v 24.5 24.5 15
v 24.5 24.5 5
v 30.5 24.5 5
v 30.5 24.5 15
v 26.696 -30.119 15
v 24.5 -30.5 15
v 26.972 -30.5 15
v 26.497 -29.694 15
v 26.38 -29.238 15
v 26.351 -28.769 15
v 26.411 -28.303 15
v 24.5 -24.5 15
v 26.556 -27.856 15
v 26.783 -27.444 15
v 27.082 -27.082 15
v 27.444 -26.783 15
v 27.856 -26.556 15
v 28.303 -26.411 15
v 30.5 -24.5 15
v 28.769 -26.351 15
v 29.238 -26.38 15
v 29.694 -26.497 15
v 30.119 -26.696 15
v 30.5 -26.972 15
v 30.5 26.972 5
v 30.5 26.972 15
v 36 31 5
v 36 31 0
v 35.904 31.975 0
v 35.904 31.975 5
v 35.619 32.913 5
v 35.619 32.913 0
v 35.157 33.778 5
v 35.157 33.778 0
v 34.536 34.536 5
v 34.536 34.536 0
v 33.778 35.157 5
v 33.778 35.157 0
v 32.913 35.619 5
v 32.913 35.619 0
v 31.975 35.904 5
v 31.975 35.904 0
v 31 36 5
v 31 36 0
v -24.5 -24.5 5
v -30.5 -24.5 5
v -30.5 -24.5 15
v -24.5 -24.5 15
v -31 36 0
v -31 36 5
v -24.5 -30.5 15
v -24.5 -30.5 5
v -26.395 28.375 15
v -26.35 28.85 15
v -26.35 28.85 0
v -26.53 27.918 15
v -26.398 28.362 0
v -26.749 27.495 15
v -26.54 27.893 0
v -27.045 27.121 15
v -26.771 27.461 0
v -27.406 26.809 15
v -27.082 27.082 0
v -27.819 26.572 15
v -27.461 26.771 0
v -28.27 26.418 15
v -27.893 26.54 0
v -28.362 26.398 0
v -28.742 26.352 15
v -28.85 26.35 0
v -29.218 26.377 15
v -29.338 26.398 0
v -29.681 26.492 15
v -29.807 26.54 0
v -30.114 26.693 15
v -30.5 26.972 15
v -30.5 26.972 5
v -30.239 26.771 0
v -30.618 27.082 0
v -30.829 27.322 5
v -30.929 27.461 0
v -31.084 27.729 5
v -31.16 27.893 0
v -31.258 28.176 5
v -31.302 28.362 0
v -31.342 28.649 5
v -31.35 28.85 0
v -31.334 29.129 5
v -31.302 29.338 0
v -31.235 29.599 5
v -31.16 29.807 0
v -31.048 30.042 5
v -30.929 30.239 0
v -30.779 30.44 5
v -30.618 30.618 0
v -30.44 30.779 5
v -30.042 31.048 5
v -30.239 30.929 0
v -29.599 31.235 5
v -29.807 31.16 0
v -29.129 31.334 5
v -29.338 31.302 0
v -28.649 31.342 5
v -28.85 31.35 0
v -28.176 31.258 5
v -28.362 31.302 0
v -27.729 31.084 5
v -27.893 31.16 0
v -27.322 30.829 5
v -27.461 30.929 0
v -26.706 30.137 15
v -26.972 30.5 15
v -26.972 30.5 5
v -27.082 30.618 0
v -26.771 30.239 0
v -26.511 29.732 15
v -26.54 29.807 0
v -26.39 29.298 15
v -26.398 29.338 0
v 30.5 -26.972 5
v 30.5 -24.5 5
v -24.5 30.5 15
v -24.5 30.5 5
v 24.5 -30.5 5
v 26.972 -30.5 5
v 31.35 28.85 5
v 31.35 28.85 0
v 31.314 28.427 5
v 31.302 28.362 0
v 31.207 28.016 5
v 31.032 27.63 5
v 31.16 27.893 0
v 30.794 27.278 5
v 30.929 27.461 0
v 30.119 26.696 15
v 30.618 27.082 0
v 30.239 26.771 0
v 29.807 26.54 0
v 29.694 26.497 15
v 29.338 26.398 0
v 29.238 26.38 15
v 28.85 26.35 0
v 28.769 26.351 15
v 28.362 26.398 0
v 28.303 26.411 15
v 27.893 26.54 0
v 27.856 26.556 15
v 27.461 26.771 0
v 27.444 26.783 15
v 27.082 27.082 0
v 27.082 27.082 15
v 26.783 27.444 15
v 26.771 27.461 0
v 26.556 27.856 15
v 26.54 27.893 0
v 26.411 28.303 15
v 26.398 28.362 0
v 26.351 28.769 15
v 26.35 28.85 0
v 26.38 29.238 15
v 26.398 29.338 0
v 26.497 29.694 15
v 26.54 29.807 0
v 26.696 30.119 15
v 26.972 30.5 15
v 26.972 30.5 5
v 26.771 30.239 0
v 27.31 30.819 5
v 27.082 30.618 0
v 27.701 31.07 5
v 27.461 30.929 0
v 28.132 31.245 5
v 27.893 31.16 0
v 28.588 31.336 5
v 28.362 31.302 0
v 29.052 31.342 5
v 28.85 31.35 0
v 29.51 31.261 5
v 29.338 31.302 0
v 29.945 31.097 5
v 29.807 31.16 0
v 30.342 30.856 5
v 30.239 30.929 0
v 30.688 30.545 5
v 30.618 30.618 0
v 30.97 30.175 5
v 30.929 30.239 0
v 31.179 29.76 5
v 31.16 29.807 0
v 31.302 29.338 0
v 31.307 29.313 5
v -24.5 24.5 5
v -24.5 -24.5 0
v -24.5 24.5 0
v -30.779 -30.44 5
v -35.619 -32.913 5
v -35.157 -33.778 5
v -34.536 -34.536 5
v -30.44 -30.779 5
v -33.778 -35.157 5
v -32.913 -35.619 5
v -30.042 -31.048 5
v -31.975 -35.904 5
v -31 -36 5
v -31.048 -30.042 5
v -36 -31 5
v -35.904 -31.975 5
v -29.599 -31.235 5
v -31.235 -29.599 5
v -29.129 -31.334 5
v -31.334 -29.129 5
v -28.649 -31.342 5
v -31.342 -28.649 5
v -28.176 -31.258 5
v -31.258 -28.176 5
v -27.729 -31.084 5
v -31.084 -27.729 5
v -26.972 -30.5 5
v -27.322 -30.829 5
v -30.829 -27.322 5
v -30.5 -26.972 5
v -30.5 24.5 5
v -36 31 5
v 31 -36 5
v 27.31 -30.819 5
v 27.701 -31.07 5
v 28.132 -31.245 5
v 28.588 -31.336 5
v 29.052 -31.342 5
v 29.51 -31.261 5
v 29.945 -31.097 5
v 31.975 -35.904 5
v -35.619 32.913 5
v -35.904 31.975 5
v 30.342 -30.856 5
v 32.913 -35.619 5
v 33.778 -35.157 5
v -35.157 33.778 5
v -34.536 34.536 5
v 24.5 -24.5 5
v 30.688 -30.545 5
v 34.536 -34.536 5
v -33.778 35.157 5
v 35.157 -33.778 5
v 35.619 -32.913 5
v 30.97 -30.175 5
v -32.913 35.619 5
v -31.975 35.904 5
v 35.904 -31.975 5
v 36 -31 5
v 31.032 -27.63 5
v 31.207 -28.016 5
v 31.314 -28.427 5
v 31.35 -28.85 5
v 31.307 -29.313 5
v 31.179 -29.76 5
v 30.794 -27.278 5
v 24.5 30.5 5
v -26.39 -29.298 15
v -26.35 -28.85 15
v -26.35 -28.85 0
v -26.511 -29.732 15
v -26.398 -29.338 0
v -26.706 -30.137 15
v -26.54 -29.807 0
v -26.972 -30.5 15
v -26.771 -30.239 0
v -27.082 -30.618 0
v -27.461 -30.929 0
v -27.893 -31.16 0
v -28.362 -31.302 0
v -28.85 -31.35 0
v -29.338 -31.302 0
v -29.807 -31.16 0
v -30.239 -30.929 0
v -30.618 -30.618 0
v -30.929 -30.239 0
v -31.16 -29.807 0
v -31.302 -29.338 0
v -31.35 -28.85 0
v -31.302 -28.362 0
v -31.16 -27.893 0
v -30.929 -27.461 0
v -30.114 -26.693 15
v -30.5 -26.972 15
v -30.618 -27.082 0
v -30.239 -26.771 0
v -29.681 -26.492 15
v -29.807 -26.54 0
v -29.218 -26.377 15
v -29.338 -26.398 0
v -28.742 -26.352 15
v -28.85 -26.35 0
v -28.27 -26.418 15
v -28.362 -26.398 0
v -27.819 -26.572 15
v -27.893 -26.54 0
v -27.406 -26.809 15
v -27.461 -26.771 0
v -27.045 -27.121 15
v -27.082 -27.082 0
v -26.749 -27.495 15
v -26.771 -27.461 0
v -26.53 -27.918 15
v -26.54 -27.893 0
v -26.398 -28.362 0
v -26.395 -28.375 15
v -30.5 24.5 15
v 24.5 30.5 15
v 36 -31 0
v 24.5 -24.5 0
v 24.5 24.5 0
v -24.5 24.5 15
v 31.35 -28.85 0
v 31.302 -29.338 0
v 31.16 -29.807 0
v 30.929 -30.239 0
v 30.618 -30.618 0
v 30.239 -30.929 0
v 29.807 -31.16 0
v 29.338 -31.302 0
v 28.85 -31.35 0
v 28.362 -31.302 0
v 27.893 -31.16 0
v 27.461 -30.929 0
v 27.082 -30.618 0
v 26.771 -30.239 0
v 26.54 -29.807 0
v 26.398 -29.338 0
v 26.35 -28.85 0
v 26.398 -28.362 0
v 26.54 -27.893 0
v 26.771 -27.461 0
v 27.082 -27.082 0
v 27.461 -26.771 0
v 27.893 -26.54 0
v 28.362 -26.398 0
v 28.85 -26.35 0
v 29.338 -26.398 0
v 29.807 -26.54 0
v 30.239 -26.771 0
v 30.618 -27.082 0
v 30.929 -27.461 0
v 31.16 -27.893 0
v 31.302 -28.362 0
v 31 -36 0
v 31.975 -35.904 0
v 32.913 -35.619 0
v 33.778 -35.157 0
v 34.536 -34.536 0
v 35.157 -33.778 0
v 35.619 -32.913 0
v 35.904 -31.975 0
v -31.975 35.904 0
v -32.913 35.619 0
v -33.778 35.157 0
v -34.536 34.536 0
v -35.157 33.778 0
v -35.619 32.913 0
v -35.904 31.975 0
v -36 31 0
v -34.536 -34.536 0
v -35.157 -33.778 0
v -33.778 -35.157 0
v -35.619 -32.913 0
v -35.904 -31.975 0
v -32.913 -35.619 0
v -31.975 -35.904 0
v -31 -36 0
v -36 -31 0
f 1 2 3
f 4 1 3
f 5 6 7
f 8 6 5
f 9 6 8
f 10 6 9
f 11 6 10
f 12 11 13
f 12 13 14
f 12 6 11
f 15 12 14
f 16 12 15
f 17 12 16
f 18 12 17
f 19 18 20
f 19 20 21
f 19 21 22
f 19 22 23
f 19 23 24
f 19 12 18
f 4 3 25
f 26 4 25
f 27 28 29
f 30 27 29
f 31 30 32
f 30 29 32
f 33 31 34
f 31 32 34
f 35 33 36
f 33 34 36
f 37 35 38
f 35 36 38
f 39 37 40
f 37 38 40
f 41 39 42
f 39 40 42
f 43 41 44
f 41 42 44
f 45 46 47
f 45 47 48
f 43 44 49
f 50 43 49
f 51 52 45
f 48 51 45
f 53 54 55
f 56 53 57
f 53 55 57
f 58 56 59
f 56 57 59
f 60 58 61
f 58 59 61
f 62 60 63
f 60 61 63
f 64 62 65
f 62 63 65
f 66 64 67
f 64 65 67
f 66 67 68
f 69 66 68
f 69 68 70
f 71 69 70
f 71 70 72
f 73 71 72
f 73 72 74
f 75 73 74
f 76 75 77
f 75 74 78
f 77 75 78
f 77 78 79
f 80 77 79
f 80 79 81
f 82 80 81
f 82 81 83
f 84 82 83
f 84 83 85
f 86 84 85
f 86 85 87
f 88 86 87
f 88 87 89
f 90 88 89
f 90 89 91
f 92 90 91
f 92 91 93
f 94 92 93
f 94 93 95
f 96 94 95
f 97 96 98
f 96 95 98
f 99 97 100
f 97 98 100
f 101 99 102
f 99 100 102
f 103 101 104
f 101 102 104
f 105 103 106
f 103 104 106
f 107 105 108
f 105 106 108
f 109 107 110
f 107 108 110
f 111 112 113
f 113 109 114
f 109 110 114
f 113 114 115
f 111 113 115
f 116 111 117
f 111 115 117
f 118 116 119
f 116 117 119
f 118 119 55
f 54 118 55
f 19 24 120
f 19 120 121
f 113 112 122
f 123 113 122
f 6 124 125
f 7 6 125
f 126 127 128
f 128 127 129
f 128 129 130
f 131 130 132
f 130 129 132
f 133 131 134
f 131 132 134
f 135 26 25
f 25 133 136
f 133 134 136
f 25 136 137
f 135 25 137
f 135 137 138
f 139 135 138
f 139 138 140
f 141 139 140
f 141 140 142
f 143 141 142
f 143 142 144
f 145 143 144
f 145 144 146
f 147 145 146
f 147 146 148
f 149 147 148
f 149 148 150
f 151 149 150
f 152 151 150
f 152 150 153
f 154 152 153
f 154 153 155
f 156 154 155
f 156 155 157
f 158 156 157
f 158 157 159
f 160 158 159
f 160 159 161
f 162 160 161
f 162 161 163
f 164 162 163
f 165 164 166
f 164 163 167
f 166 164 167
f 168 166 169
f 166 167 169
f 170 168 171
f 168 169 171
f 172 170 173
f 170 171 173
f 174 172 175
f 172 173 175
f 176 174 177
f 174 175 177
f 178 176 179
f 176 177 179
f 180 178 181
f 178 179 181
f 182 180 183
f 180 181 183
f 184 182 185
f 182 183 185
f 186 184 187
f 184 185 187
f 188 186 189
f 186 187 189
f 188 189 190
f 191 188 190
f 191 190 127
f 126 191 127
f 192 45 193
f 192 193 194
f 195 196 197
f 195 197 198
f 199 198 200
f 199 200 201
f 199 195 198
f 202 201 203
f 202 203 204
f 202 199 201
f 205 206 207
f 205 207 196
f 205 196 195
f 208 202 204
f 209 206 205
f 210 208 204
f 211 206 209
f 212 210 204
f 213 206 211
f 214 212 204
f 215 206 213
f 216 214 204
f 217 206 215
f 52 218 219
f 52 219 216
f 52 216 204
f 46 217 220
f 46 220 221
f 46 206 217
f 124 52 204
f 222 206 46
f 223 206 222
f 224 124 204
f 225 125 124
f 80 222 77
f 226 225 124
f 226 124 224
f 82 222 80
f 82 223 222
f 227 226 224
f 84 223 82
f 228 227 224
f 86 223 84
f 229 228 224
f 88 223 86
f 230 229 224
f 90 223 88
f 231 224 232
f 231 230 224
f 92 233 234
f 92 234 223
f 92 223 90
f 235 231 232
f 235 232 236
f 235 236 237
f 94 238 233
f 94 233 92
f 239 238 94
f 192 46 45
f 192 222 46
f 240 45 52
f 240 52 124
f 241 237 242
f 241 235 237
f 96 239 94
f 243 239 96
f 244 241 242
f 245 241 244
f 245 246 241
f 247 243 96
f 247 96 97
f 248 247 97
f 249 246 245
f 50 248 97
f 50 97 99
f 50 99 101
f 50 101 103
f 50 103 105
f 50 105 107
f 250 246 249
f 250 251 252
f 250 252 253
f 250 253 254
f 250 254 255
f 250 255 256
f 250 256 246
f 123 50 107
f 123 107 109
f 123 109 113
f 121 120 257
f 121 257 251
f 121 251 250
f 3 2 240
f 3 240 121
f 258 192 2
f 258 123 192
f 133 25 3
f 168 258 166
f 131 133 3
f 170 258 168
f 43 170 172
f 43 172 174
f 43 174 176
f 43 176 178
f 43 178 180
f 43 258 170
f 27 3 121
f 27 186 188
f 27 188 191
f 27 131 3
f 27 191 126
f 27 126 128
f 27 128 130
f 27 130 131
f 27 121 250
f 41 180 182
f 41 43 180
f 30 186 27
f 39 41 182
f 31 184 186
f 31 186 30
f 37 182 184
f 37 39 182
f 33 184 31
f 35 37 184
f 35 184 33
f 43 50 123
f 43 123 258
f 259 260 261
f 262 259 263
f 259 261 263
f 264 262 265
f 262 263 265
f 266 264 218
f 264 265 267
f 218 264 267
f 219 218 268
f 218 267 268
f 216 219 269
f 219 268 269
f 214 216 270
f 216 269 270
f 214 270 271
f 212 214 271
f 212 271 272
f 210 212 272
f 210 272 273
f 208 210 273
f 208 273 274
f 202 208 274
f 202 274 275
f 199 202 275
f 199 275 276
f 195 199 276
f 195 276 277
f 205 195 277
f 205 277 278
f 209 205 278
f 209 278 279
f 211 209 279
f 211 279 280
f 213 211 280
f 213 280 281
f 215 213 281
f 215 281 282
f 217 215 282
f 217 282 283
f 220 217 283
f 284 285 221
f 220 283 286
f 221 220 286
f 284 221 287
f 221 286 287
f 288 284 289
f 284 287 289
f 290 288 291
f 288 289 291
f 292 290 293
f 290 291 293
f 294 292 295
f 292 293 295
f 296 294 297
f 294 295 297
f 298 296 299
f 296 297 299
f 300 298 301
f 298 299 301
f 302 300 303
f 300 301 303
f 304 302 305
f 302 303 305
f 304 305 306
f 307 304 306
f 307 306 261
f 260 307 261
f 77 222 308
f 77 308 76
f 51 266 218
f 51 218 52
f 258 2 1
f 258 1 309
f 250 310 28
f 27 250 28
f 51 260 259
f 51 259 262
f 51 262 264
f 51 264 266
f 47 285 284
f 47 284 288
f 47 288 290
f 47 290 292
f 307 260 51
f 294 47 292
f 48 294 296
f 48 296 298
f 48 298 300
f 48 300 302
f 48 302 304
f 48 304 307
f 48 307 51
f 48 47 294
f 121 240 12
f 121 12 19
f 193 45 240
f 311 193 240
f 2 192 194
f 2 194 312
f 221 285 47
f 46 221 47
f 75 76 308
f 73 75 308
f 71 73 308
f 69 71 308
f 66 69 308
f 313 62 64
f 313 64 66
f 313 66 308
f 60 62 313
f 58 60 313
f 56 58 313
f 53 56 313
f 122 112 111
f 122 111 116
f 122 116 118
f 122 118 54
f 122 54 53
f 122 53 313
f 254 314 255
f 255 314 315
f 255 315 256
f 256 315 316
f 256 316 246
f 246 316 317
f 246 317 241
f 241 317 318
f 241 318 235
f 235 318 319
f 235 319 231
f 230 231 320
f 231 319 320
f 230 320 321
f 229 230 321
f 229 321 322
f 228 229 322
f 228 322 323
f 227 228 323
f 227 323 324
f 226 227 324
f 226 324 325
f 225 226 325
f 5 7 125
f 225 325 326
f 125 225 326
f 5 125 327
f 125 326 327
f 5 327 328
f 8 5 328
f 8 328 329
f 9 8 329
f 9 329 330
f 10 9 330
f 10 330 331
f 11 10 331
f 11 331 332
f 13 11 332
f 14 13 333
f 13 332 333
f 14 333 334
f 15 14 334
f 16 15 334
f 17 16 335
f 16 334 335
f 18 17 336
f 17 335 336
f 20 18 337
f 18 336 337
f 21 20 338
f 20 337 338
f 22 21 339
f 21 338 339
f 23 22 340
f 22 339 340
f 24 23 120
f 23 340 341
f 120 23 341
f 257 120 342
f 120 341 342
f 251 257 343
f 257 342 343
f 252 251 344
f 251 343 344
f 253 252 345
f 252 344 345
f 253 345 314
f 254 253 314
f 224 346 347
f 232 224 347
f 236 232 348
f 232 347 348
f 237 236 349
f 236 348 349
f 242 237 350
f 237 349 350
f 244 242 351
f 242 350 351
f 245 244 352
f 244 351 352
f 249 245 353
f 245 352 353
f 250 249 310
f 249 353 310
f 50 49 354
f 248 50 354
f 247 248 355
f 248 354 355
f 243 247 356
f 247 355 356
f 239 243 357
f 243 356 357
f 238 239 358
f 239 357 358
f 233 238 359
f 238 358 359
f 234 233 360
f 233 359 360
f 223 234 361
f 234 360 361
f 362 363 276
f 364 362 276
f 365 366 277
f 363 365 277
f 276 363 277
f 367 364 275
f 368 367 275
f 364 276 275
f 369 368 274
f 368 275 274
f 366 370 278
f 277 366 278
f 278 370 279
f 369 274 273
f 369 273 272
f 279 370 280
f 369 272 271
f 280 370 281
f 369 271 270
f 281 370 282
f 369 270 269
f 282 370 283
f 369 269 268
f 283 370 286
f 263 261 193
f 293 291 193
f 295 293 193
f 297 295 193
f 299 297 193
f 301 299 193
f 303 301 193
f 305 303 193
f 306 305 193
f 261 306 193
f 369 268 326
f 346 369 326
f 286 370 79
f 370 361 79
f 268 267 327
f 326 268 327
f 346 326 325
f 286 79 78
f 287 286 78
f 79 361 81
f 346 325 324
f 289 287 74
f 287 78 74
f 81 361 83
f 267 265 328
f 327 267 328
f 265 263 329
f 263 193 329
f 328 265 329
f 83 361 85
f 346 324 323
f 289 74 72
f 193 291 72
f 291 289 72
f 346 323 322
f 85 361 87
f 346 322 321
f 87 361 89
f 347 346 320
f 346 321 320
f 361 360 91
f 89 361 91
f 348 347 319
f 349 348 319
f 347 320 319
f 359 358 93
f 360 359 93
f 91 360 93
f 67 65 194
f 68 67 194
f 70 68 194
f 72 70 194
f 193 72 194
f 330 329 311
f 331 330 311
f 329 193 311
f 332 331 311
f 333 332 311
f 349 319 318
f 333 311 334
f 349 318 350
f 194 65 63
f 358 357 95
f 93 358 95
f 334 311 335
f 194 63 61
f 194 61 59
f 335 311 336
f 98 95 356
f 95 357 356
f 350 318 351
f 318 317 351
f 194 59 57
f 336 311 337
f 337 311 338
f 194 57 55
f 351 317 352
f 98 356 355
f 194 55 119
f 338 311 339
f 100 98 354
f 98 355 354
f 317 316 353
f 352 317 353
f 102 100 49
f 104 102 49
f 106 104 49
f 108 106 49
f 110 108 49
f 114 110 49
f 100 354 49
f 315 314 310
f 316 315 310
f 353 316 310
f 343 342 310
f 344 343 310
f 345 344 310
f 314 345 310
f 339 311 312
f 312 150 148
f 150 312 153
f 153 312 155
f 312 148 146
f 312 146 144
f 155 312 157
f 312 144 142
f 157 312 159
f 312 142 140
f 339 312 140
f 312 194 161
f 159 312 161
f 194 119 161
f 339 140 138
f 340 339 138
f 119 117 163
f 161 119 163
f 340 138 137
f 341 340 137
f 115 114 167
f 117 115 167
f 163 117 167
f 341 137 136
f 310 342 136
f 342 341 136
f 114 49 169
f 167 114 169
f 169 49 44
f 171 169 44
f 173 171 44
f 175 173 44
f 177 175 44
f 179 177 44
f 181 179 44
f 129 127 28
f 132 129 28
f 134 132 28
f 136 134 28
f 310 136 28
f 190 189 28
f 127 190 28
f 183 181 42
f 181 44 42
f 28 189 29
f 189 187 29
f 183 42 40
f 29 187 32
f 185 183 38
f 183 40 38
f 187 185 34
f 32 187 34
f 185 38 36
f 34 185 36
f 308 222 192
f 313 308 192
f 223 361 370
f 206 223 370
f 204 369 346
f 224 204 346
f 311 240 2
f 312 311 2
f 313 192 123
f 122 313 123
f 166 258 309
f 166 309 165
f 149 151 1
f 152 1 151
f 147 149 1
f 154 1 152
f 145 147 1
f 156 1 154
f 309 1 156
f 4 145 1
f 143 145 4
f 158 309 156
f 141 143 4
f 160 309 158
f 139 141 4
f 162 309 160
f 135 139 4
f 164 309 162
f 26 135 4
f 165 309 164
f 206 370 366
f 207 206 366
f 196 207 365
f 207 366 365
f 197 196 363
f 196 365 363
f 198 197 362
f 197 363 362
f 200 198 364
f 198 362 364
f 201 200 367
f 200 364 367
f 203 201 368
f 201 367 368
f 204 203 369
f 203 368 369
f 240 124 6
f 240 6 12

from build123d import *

# Parameters (mm, degrees)
PAD_DEPTH       = 5
SKETCH001_W     = 6
SKETCH001_H     = 6
PAD001_DEPTH    = 10
SKETCH002_W     = 49
SKETCH002_H     = 49
POCKET_DEPTH    = 5.001
SKETCH003_R     = 2.5
POCKET001_DEPTH = 15.001


with BuildPart() as part:
    # Sketch → Pad (new body)
    with BuildSketch(Plane.XY):
        with BuildLine():
            ThreePointArc((-31, 36), (-34.535534, 34.535534), (-36, 31))
            Line((-36, 31), (-36, -31))
            ThreePointArc((-36, -31), (-34.535534, -34.535534), (-31, -36))
            Line((-31, -36), (31, -36))
            ThreePointArc((31, -36), (34.535534, -34.535534), (36, -31))
            Line((36, -31), (36, 31))
            ThreePointArc((36, 31), (34.535534, 34.535534), (31, 36))
            Line((31, 36), (-31, 36))
        make_face()
    extrude(amount=PAD_DEPTH)

    # Sketch001 (on Face10 of Pad) → Pad001 (join)
    with BuildSketch(Plane.XY.offset(5)):
        with Locations((-27.5, 27.5)):
            Rectangle(SKETCH001_W, SKETCH001_H)
        with Locations((27.5, 27.5)):
            Rectangle(SKETCH001_W, SKETCH001_H)
        with Locations((27.5, -27.5)):
            Rectangle(SKETCH001_W, SKETCH001_H)
        with Locations((-27.5, -27.5)):
            Rectangle(SKETCH001_W, SKETCH001_H)
    extrude(amount=PAD001_DEPTH)

    # Sketch002 (on Face5 of Pad001) → Pocket (cut, through all)
    with BuildSketch(Plane.XY.offset(5)):
        Rectangle(SKETCH002_W, SKETCH002_H)
    extrude(amount=-POCKET_DEPTH, mode=Mode.SUBTRACT)

    # Sketch003 (on Face4 of Pocket) → Pocket001 (cut, through all)
    with BuildSketch(Plane(origin=(0, 0, 0), x_dir=(1, 0, 0), z_dir=(0, 0, -1))):
        with Locations((-28.849957, 28.849957)):
            Circle(SKETCH003_R)
        with Locations((28.849957, 28.849957)):
            Circle(SKETCH003_R)
        with Locations((28.849957, -28.849957)):
            Circle(SKETCH003_R)
        with Locations((-28.849957, -28.849957)):
            Circle(SKETCH003_R)
    extrude(amount=-POCKET001_DEPTH, mode=Mode.SUBTRACT)


solid = part.part
